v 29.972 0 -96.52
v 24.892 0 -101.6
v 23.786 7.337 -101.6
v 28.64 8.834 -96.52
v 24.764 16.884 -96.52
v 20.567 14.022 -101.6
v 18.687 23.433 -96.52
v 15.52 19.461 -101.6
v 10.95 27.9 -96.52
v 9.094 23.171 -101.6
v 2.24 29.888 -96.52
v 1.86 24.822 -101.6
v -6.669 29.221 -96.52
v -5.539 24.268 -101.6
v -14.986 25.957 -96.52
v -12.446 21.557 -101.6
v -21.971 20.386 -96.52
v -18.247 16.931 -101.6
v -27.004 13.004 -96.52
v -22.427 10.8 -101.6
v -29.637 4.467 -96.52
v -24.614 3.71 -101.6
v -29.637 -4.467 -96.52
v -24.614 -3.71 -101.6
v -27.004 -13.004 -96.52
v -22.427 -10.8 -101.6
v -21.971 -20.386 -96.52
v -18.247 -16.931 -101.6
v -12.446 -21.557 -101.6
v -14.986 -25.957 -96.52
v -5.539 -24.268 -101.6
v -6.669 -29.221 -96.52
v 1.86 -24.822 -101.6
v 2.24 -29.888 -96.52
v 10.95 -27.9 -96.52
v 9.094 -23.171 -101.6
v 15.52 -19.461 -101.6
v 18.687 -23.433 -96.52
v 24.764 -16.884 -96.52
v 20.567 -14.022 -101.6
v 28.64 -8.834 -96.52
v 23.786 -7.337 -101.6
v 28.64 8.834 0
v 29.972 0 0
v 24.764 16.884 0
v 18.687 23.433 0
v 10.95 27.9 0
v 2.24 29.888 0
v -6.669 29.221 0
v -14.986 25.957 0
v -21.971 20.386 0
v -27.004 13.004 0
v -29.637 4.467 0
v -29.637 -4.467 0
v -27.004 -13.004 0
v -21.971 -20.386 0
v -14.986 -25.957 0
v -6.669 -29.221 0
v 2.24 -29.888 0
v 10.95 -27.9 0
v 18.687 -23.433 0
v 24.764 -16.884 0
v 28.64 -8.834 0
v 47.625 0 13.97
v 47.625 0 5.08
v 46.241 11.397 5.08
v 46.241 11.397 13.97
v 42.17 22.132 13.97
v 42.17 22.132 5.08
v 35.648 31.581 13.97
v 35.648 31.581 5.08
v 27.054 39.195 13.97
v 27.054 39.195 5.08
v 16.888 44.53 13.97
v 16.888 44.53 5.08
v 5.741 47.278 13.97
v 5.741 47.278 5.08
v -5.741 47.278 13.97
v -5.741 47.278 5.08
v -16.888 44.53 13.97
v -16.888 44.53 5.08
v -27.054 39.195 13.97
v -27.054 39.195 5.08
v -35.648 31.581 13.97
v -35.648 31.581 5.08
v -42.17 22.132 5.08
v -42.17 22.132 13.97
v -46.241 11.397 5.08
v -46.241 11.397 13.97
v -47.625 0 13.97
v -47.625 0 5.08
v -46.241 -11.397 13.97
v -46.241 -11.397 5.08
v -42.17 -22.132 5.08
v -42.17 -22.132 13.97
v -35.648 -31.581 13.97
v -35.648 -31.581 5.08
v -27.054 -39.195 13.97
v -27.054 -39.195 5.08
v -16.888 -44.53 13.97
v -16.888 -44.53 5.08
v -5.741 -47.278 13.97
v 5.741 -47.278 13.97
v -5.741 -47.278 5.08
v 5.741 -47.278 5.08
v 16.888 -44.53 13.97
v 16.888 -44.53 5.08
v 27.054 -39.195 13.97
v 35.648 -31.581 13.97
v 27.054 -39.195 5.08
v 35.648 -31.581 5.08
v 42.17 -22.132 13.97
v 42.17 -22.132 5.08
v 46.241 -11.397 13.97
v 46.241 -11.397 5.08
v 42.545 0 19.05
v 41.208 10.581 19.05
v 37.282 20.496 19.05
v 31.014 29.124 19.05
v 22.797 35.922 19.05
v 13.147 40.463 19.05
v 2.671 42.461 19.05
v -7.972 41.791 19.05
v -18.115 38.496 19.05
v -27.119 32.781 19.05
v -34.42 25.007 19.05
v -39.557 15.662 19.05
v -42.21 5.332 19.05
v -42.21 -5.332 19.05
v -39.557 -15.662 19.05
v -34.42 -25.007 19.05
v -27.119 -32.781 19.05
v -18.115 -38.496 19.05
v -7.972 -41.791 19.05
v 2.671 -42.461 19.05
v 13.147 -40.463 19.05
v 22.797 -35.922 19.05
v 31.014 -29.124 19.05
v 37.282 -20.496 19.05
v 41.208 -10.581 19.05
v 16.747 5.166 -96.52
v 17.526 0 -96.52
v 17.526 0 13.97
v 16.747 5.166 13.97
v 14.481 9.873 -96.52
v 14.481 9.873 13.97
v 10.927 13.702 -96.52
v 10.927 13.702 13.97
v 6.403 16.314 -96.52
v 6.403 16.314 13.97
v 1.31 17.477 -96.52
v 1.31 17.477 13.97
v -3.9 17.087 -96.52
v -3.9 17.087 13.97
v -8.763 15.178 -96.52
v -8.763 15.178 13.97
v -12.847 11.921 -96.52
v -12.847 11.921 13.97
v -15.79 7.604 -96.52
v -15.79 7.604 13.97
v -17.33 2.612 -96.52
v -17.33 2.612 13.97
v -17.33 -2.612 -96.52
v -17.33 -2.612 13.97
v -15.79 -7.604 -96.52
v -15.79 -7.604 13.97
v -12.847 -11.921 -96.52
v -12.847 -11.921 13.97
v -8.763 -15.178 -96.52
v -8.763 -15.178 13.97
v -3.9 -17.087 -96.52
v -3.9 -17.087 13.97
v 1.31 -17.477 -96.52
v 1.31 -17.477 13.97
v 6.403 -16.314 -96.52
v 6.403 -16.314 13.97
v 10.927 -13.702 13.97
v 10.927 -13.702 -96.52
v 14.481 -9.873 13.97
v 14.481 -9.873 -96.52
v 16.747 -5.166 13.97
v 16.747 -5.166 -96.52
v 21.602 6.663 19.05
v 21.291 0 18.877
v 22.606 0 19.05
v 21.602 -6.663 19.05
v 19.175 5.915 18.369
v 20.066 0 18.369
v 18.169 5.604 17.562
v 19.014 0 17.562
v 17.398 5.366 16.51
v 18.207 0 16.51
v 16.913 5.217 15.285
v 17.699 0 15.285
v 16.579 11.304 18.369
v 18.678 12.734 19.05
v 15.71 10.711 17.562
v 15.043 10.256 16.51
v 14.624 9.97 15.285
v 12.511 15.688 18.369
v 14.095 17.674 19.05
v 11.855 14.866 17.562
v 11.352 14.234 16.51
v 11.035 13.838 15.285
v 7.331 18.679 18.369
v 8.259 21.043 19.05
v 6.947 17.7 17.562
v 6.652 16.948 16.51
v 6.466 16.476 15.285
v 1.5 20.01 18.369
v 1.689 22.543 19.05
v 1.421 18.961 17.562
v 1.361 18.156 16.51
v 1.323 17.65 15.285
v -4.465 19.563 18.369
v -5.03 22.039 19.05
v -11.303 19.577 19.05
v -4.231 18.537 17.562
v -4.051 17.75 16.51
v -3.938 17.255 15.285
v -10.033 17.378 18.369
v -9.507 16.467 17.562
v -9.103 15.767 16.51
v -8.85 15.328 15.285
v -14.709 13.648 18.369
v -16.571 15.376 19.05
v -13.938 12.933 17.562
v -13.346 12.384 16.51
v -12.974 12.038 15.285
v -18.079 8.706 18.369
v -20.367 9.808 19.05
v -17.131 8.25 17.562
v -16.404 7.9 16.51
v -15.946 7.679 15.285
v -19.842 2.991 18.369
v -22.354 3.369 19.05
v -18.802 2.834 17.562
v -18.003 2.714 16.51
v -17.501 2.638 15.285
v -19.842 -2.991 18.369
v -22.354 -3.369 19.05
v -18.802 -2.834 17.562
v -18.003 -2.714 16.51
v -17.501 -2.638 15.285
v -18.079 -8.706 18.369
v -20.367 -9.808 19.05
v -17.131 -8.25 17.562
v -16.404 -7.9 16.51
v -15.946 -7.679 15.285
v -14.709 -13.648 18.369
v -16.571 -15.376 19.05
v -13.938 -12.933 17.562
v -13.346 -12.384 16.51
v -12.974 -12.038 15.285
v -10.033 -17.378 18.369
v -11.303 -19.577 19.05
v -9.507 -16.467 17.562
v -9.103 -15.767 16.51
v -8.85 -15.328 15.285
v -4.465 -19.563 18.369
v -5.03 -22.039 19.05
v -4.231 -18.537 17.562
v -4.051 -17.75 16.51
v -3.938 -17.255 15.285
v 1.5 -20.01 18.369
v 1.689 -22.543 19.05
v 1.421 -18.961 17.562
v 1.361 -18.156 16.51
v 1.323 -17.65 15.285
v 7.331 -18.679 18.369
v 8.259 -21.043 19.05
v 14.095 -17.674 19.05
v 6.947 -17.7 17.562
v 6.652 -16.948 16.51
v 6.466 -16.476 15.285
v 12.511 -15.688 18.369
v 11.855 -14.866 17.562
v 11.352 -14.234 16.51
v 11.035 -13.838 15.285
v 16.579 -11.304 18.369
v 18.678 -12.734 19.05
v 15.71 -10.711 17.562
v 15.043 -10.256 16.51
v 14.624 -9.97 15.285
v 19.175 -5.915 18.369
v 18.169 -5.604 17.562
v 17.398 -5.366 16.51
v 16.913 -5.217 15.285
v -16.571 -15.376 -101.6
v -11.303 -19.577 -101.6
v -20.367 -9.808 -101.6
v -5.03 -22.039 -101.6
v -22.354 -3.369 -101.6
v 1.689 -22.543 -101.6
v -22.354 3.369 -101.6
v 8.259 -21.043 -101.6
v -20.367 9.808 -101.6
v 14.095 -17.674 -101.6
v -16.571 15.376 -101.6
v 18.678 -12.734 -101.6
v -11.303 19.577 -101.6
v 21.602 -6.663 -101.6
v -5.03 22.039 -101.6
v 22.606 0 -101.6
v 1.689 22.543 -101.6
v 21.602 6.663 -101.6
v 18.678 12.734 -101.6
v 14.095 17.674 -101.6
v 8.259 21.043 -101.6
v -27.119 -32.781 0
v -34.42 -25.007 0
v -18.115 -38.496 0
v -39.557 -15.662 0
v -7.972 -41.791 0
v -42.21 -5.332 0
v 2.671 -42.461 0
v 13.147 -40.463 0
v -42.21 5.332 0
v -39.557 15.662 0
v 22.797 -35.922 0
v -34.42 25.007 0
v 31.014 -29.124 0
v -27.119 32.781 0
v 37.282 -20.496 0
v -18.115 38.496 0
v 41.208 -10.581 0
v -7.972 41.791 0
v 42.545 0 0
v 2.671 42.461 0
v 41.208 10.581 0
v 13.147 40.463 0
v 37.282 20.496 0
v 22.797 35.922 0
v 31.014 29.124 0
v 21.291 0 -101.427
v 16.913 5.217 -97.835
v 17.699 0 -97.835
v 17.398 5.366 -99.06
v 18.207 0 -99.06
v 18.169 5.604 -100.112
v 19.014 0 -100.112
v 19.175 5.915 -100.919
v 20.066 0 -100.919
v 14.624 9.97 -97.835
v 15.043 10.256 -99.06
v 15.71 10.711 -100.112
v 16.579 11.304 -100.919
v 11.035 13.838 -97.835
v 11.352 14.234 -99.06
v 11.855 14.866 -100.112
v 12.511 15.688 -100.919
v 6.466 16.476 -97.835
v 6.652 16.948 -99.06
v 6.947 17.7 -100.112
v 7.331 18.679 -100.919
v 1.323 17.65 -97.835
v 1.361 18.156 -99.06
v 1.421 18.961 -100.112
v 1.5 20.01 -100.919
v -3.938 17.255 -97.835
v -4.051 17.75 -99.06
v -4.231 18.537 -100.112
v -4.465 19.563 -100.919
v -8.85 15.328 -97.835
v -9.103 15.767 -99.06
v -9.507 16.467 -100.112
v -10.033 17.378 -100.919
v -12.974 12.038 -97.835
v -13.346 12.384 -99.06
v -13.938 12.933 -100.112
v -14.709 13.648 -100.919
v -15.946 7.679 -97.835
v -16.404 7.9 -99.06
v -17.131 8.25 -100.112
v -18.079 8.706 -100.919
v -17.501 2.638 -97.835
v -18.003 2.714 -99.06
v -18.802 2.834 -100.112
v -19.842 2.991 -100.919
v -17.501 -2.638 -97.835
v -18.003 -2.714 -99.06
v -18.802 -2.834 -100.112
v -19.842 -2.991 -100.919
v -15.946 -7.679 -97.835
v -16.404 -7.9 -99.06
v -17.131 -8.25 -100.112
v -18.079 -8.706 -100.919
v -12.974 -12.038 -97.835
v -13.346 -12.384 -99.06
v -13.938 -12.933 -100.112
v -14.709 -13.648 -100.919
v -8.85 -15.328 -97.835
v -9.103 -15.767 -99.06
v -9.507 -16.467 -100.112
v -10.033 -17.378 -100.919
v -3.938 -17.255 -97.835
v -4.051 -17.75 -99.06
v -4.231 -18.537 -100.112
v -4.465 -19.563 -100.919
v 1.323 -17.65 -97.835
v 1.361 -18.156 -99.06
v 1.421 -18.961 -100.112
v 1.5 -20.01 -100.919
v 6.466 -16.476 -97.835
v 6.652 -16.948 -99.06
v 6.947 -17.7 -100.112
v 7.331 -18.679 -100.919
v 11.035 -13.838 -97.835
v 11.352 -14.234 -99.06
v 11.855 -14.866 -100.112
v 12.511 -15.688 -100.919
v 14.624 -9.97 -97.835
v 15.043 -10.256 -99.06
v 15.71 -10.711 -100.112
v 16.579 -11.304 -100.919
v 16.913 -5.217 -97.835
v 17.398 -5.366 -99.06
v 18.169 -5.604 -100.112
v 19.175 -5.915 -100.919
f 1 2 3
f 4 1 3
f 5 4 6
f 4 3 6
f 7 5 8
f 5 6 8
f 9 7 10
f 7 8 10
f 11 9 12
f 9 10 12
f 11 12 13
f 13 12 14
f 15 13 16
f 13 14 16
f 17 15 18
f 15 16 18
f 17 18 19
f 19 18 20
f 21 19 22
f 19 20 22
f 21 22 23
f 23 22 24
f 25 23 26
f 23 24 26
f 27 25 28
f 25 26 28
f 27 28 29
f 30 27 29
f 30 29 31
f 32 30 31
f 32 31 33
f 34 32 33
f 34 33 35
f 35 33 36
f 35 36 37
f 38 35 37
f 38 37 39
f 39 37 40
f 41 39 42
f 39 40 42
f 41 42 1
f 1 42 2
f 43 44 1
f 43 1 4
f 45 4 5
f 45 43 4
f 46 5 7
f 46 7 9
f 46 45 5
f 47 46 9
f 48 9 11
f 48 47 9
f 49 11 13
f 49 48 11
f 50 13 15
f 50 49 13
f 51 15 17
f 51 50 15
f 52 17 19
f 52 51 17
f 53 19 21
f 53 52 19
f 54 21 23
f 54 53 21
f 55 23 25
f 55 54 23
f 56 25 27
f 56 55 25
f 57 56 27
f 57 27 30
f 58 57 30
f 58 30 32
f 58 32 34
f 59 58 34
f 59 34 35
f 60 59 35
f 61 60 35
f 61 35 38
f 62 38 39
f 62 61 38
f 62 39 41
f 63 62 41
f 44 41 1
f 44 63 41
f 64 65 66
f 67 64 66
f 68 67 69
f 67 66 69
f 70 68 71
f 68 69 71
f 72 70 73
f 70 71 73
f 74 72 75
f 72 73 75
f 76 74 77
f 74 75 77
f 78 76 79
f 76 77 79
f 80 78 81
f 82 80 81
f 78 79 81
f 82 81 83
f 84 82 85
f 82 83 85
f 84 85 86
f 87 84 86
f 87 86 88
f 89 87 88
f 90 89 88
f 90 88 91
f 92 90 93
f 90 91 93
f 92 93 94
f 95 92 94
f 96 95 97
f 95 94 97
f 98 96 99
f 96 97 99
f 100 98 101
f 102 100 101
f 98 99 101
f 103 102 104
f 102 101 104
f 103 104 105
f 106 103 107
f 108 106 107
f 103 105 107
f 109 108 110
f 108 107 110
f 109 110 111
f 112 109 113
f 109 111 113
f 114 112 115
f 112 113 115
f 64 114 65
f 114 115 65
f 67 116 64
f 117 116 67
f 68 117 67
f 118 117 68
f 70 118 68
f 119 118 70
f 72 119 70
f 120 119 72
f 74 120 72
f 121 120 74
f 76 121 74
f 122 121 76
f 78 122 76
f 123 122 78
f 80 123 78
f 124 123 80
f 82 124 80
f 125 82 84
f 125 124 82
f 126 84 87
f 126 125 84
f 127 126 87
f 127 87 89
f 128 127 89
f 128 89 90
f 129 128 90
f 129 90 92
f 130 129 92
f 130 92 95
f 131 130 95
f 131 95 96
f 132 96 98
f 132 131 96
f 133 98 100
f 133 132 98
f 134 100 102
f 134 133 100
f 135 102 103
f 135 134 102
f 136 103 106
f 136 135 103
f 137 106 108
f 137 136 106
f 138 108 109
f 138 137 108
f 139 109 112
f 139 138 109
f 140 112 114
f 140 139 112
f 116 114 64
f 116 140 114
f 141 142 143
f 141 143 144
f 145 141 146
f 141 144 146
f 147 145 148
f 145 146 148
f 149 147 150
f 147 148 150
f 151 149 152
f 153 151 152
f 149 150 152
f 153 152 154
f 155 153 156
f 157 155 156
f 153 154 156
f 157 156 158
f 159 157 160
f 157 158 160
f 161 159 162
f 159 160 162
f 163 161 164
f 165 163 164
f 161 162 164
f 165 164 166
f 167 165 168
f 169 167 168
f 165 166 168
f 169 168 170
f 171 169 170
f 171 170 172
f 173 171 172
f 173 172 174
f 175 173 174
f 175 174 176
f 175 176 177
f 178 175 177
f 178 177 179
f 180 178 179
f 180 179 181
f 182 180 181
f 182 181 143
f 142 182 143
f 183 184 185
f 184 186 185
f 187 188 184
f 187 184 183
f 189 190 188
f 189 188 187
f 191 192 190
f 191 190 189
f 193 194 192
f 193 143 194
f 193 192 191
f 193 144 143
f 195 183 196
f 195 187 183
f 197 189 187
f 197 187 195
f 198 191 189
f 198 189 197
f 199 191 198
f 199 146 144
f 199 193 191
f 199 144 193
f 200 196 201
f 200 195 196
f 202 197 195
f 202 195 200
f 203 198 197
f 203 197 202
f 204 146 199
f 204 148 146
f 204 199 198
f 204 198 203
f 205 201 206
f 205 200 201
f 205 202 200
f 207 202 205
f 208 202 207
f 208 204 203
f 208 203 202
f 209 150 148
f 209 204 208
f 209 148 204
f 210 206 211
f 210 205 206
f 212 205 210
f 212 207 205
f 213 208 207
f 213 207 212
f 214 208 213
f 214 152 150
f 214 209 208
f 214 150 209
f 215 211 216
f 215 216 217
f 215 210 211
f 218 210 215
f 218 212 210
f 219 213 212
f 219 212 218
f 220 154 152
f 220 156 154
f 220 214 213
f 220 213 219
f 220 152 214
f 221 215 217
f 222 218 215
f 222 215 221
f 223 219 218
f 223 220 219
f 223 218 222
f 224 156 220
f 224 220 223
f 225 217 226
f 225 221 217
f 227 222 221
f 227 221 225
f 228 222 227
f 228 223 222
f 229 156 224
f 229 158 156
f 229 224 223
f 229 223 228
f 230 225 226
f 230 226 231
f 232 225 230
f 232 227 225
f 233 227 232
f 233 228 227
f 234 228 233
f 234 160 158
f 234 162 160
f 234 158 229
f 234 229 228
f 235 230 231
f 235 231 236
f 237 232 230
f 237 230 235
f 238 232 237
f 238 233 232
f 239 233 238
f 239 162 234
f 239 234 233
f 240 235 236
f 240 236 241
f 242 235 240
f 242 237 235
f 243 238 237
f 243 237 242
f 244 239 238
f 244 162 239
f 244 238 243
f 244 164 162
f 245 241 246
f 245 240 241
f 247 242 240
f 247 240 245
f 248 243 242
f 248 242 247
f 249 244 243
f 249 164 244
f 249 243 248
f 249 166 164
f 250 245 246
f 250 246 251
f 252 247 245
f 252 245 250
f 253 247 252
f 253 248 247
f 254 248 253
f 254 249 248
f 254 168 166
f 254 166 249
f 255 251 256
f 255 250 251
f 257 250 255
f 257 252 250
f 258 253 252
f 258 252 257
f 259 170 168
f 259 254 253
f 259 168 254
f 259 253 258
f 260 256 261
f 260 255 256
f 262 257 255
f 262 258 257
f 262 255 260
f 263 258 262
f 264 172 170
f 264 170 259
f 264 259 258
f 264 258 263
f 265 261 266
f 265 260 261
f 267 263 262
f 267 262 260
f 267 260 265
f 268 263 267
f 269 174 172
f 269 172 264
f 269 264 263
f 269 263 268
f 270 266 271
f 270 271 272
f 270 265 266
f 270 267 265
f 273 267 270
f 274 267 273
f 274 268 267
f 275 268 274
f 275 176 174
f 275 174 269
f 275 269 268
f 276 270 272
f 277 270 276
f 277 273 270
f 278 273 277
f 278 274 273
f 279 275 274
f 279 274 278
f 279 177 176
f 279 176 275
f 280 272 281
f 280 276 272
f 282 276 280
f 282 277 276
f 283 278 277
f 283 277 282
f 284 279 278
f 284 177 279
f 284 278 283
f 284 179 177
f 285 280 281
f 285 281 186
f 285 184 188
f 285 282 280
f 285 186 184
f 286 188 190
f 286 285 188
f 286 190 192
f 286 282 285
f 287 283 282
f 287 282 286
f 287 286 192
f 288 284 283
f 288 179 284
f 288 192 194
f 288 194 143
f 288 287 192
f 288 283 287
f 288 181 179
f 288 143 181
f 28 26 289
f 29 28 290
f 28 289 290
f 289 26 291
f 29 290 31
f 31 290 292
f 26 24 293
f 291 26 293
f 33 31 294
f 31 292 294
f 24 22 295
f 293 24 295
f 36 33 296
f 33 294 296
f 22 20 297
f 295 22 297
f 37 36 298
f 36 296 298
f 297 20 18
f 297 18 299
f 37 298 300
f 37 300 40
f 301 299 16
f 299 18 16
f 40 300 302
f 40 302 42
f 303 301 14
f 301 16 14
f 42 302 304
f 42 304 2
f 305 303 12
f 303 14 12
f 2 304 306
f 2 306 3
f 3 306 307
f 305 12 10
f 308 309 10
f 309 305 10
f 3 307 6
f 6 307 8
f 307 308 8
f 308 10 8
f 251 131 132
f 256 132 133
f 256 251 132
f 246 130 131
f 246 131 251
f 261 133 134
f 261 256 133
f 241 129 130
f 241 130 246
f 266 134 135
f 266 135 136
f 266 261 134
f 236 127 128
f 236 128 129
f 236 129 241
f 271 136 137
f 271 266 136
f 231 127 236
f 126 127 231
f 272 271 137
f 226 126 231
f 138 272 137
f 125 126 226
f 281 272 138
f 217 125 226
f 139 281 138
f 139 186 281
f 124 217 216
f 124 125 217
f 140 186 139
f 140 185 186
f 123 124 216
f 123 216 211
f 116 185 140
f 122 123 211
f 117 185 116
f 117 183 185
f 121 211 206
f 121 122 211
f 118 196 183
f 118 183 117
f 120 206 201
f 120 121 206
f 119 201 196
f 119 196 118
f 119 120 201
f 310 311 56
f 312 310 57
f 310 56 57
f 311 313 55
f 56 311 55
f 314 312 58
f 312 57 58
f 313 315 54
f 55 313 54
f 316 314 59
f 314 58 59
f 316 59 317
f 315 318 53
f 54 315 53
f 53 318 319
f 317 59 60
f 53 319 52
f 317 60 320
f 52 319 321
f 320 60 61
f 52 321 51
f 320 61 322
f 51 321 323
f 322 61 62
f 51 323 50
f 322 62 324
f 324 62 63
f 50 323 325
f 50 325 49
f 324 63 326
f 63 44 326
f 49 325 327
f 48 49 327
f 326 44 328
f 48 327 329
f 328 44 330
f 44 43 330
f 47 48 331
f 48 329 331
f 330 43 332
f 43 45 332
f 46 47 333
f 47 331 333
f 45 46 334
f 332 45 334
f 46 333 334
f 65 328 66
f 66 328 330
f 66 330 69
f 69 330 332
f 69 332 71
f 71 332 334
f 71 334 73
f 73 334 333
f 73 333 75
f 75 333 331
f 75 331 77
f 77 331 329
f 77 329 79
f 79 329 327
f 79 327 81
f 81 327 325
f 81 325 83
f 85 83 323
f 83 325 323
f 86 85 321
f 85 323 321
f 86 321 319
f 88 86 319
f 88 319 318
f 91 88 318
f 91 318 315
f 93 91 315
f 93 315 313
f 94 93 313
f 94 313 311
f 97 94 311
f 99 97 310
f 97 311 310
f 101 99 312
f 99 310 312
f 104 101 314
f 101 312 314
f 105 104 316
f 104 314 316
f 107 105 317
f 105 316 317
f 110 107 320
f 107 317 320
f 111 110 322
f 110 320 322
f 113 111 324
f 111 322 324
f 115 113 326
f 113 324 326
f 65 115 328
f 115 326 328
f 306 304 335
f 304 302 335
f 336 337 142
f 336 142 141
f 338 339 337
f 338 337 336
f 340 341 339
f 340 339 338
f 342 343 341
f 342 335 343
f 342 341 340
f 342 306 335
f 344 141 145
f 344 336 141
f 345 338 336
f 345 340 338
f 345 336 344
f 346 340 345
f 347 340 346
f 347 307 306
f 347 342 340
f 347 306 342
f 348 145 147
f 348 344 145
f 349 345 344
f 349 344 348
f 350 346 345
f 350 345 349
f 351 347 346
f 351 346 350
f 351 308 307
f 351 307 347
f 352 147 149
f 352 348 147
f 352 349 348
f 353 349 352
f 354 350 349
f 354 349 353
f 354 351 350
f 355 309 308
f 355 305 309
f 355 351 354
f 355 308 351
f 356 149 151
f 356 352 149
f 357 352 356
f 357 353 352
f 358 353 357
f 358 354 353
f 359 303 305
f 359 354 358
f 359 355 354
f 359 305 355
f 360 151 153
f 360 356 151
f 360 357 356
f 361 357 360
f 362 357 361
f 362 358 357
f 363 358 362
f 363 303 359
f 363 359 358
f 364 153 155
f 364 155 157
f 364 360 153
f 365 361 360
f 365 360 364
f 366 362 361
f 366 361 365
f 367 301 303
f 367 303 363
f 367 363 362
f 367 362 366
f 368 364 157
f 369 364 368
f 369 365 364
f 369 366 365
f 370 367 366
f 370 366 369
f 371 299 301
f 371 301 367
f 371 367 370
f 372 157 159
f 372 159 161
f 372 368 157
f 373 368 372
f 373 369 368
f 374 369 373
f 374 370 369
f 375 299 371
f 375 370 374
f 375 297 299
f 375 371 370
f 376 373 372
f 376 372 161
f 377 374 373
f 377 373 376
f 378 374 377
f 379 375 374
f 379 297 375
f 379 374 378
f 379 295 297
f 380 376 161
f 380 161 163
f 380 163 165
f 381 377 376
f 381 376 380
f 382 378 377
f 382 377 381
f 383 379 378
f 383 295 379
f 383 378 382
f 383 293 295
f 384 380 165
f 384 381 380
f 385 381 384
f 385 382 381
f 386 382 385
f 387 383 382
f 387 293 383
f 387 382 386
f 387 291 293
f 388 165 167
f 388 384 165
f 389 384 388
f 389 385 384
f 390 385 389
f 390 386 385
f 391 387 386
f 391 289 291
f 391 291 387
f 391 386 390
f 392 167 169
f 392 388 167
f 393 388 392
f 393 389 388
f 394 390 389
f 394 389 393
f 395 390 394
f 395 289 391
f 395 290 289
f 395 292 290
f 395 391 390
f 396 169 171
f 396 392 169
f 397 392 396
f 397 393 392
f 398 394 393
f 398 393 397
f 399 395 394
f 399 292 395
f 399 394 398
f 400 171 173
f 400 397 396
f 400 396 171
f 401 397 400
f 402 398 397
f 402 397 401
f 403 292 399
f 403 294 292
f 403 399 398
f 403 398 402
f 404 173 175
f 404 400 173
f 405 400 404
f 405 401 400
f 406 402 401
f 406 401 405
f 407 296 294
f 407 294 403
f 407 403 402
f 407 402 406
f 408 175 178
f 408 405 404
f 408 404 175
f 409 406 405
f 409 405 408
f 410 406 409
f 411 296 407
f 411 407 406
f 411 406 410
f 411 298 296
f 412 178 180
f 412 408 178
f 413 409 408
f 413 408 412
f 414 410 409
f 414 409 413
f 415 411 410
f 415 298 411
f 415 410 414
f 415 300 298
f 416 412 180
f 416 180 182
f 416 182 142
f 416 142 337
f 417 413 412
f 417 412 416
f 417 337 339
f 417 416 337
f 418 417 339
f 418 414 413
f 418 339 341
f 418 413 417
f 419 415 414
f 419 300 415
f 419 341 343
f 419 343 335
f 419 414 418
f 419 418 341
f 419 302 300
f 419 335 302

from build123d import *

# Parameters (mm, degrees)
F0_R     = 29.972
F1_DEPTH = 101.6
F2_R     = 47.625
F3_DEPTH = 19.05
F4_R     = 17.526
F5_DEPTH = 120.651
F6_SIZE  = 5.08
F7_R     = 5.08


with BuildPart() as f1:
    # F0 (on Top) → F1 (new body)
    with BuildSketch(Plane.XY):
        Circle(F0_R)
    extrude(amount=-F1_DEPTH)

    # F2 (on Top) → F3 (join)
    with BuildSketch(Plane.XY):
        Circle(F2_R)
    extrude(amount=F3_DEPTH)

    # F4 (on face) → F5 (cut, through all)
    with BuildSketch(Plane.XY.offset(19.05)):
        Circle(F4_R)
    extrude(amount=-F5_DEPTH, mode=Mode.SUBTRACT)

    # F6
    f6_edges = [f1.edges().sort_by_distance(p)[0] for p in [
        (-29.972, 0, -101.6),
        (-47.625, 0, 0),
        (-47.625, 0, 19.05),
    ]]
    chamfer(f6_edges, length=F6_SIZE)

    # F7
    f7_edges = [f1.edges().sort_by_distance(p)[0] for p in [
        (-17.526, 0, 19.05),
        (-17.526, 0, -101.6),
    ]]
    fillet(f7_edges, radius=F7_R)


solid = f1.part
